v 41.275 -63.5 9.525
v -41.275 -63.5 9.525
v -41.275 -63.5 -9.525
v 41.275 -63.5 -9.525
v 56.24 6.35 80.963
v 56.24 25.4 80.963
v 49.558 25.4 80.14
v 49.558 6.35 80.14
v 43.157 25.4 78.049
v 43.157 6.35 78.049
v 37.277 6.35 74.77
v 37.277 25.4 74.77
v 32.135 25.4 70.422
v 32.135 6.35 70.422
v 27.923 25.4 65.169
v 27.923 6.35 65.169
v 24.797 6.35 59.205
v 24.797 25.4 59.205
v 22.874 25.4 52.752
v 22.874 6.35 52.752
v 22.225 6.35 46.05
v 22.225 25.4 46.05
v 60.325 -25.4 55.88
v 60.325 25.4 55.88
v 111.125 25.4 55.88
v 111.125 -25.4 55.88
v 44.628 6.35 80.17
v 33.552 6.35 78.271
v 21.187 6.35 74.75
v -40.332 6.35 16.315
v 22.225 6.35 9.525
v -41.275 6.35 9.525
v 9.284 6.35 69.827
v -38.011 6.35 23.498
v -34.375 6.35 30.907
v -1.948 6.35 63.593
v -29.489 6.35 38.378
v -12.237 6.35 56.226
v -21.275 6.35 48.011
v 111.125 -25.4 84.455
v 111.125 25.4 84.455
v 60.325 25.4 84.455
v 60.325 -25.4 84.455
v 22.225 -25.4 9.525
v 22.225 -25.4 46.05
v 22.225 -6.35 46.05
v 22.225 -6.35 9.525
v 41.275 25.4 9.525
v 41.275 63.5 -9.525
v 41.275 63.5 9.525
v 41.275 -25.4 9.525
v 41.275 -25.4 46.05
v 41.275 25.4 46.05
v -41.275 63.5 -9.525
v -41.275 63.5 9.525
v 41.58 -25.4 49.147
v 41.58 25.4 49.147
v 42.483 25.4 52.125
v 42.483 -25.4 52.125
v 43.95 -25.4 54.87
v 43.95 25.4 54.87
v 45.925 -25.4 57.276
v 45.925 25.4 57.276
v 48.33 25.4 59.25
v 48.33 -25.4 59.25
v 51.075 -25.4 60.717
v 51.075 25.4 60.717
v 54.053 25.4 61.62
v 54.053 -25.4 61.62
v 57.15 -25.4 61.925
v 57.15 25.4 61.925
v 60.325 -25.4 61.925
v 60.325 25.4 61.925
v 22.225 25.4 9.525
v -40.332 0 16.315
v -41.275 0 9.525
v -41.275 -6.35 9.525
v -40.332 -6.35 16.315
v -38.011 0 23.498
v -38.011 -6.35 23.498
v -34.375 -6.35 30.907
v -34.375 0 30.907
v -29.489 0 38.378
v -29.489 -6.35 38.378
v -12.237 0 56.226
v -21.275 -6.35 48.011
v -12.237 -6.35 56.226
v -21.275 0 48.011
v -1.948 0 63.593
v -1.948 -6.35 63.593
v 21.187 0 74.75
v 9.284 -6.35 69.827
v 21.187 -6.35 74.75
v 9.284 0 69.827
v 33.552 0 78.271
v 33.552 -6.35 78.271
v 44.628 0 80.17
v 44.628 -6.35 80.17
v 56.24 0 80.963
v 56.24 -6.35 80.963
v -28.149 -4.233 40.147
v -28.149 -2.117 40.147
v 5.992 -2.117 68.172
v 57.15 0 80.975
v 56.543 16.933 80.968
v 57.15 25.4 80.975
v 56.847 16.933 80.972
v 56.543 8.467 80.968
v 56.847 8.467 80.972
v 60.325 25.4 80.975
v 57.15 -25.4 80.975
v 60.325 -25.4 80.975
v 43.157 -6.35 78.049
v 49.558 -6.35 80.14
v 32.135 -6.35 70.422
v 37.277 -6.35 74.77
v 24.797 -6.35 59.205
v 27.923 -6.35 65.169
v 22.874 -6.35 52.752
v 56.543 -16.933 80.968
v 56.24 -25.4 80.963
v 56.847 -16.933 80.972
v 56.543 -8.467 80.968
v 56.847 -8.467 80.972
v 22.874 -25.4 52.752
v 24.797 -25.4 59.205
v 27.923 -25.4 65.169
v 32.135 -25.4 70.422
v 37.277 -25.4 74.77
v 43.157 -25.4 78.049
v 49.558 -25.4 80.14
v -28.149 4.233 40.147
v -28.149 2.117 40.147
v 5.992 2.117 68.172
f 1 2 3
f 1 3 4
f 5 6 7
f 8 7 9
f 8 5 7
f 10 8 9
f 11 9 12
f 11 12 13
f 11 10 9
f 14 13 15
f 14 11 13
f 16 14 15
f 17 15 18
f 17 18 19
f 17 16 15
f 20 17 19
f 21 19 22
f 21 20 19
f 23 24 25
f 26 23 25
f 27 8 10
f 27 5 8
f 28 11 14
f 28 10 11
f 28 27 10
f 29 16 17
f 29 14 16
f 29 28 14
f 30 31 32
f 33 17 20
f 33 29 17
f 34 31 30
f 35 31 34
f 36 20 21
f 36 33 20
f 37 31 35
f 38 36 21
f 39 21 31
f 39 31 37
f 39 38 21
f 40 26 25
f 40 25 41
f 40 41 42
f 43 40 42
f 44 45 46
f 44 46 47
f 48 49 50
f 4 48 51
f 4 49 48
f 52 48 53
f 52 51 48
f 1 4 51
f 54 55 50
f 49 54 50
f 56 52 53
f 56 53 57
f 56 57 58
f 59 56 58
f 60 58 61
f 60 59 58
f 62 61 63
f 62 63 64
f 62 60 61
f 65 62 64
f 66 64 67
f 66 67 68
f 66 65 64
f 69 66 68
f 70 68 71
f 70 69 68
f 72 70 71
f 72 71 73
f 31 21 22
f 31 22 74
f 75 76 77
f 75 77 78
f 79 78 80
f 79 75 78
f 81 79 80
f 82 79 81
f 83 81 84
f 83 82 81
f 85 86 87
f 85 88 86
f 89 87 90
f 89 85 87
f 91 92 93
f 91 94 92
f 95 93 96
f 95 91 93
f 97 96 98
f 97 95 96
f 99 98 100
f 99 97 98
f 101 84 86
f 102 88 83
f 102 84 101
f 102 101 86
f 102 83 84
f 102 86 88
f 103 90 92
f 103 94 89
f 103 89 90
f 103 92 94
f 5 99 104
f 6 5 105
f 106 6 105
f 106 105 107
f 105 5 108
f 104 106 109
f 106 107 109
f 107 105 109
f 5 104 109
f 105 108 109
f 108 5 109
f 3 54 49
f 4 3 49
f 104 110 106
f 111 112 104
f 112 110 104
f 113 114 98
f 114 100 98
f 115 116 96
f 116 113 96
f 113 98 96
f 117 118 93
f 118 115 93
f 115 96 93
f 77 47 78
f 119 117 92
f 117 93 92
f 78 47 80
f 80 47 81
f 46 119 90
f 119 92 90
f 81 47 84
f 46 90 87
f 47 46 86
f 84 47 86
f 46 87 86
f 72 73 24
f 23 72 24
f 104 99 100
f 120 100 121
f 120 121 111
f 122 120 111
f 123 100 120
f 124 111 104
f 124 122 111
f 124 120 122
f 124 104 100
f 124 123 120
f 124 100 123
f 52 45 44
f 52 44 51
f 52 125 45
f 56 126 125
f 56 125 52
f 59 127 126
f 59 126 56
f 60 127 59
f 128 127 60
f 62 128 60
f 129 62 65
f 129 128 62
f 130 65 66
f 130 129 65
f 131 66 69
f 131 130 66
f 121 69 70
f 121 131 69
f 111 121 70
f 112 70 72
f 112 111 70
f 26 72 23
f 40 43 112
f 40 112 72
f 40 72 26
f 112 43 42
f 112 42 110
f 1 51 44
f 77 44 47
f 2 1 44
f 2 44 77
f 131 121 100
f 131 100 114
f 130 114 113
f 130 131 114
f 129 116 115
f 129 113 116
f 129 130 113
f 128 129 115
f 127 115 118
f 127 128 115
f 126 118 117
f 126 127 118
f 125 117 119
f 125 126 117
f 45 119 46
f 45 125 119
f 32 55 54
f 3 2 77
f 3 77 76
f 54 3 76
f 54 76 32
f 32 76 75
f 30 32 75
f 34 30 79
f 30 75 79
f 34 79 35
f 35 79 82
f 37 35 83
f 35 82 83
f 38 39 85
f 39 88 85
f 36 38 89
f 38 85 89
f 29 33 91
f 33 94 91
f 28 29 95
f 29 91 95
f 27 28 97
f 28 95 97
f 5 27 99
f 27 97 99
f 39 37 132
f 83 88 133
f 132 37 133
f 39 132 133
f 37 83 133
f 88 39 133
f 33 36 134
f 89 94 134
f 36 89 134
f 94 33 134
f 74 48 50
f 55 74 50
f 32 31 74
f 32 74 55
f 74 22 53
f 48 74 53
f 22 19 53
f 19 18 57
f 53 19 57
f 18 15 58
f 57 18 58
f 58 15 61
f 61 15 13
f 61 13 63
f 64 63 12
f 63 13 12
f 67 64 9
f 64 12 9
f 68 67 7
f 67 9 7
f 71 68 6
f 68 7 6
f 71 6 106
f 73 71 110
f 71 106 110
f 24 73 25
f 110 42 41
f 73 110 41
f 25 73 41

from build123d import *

# Parameters (mm, degrees)
F1_DEPTH = 63.5
F0_W     = 27.5913768614
F0_H     = 19.05
F2_DEPTH = 25.4
F3_DEPTH = 6.35


with BuildPart() as f1:
    # F0 (on Front) → F1 (new body, symmetric)
    with BuildSketch(Plane.XZ):
        Polygon((22.225, 9.525), (-41.275, 9.525), (-41.275, -9.525), (41.275, -9.525), (41.275, 9.525), align=None)
    extrude(amount=F1_DEPTH, both=True)

    # F0 (on Front) → F2 (join, symmetric)
    with BuildSketch(Plane.XZ):
        with BuildLine():
            Line((22.225, 46.0502), (22.225, 9.525))
            Line((22.225, 9.525), (41.275, 9.525))
            Line((41.275, 9.525), (41.275, 46.0502))
            ThreePointArc((41.275, 46.0502), (45.9246798487, 57.2755201513), (57.15, 61.9252))
            Line((57.15, 61.9252), (60.325, 61.9252))
            Line((60.325, 61.9252), (60.325, 80.9752))
            Line((60.325, 80.9752), (57.15, 80.9752))
            add(Edge.make_bspline(
                [(56.2404700013, 80.96335483), (56.5431683561, 80.9684989137), (56.846346144, 80.9724501926), (57.15, 80.9752)],
                knots=[120.9786542661, 120.9786542661, 120.9786542661, 120.9786542661, 121.6248811101, 121.6248811101, 121.6248811101, 121.6248811101], degree=3))
            ThreePointArc((56.2404700013, 80.96335483), (32.1347950218, 70.4222156101), (22.225, 46.0502))
        make_face()
        with Locations((74.1206884307, 71.4502)):
            Rectangle(F0_W, F0_H)
        Polygon((60.325, 84.455), (60.325, 80.9752), (87.9163768614, 80.9752), (87.9163768614, 61.9252), (60.325, 61.9252), (60.325, 55.88), (111.125, 55.88), (111.125, 84.455), align=None)
    extrude(amount=F2_DEPTH, both=True)

    # F0 (on Front) → F3 (join, symmetric)
    with BuildSketch(Plane.XZ):
        with BuildLine():
            add(Edge.make_bspline(
                [(-41.275, 9.525), (-40.2919004024, 37.2334202637), (-0.4269989303, 80.0003426359), (56.2404700013, 80.96335483)],
                knots=[0, 0, 0, 0, 120.9786542661, 120.9786542661, 120.9786542661, 120.9786542661], degree=3))
            Line((-41.275, 9.525), (22.225, 9.525))
            Line((22.225, 9.525), (22.225, 46.0502))
            ThreePointArc((22.225, 46.0502), (32.1347950218, 70.4222156101), (56.2404700013, 80.96335483))
        make_face()
    extrude(amount=F3_DEPTH, both=True)


solid = f1.part
